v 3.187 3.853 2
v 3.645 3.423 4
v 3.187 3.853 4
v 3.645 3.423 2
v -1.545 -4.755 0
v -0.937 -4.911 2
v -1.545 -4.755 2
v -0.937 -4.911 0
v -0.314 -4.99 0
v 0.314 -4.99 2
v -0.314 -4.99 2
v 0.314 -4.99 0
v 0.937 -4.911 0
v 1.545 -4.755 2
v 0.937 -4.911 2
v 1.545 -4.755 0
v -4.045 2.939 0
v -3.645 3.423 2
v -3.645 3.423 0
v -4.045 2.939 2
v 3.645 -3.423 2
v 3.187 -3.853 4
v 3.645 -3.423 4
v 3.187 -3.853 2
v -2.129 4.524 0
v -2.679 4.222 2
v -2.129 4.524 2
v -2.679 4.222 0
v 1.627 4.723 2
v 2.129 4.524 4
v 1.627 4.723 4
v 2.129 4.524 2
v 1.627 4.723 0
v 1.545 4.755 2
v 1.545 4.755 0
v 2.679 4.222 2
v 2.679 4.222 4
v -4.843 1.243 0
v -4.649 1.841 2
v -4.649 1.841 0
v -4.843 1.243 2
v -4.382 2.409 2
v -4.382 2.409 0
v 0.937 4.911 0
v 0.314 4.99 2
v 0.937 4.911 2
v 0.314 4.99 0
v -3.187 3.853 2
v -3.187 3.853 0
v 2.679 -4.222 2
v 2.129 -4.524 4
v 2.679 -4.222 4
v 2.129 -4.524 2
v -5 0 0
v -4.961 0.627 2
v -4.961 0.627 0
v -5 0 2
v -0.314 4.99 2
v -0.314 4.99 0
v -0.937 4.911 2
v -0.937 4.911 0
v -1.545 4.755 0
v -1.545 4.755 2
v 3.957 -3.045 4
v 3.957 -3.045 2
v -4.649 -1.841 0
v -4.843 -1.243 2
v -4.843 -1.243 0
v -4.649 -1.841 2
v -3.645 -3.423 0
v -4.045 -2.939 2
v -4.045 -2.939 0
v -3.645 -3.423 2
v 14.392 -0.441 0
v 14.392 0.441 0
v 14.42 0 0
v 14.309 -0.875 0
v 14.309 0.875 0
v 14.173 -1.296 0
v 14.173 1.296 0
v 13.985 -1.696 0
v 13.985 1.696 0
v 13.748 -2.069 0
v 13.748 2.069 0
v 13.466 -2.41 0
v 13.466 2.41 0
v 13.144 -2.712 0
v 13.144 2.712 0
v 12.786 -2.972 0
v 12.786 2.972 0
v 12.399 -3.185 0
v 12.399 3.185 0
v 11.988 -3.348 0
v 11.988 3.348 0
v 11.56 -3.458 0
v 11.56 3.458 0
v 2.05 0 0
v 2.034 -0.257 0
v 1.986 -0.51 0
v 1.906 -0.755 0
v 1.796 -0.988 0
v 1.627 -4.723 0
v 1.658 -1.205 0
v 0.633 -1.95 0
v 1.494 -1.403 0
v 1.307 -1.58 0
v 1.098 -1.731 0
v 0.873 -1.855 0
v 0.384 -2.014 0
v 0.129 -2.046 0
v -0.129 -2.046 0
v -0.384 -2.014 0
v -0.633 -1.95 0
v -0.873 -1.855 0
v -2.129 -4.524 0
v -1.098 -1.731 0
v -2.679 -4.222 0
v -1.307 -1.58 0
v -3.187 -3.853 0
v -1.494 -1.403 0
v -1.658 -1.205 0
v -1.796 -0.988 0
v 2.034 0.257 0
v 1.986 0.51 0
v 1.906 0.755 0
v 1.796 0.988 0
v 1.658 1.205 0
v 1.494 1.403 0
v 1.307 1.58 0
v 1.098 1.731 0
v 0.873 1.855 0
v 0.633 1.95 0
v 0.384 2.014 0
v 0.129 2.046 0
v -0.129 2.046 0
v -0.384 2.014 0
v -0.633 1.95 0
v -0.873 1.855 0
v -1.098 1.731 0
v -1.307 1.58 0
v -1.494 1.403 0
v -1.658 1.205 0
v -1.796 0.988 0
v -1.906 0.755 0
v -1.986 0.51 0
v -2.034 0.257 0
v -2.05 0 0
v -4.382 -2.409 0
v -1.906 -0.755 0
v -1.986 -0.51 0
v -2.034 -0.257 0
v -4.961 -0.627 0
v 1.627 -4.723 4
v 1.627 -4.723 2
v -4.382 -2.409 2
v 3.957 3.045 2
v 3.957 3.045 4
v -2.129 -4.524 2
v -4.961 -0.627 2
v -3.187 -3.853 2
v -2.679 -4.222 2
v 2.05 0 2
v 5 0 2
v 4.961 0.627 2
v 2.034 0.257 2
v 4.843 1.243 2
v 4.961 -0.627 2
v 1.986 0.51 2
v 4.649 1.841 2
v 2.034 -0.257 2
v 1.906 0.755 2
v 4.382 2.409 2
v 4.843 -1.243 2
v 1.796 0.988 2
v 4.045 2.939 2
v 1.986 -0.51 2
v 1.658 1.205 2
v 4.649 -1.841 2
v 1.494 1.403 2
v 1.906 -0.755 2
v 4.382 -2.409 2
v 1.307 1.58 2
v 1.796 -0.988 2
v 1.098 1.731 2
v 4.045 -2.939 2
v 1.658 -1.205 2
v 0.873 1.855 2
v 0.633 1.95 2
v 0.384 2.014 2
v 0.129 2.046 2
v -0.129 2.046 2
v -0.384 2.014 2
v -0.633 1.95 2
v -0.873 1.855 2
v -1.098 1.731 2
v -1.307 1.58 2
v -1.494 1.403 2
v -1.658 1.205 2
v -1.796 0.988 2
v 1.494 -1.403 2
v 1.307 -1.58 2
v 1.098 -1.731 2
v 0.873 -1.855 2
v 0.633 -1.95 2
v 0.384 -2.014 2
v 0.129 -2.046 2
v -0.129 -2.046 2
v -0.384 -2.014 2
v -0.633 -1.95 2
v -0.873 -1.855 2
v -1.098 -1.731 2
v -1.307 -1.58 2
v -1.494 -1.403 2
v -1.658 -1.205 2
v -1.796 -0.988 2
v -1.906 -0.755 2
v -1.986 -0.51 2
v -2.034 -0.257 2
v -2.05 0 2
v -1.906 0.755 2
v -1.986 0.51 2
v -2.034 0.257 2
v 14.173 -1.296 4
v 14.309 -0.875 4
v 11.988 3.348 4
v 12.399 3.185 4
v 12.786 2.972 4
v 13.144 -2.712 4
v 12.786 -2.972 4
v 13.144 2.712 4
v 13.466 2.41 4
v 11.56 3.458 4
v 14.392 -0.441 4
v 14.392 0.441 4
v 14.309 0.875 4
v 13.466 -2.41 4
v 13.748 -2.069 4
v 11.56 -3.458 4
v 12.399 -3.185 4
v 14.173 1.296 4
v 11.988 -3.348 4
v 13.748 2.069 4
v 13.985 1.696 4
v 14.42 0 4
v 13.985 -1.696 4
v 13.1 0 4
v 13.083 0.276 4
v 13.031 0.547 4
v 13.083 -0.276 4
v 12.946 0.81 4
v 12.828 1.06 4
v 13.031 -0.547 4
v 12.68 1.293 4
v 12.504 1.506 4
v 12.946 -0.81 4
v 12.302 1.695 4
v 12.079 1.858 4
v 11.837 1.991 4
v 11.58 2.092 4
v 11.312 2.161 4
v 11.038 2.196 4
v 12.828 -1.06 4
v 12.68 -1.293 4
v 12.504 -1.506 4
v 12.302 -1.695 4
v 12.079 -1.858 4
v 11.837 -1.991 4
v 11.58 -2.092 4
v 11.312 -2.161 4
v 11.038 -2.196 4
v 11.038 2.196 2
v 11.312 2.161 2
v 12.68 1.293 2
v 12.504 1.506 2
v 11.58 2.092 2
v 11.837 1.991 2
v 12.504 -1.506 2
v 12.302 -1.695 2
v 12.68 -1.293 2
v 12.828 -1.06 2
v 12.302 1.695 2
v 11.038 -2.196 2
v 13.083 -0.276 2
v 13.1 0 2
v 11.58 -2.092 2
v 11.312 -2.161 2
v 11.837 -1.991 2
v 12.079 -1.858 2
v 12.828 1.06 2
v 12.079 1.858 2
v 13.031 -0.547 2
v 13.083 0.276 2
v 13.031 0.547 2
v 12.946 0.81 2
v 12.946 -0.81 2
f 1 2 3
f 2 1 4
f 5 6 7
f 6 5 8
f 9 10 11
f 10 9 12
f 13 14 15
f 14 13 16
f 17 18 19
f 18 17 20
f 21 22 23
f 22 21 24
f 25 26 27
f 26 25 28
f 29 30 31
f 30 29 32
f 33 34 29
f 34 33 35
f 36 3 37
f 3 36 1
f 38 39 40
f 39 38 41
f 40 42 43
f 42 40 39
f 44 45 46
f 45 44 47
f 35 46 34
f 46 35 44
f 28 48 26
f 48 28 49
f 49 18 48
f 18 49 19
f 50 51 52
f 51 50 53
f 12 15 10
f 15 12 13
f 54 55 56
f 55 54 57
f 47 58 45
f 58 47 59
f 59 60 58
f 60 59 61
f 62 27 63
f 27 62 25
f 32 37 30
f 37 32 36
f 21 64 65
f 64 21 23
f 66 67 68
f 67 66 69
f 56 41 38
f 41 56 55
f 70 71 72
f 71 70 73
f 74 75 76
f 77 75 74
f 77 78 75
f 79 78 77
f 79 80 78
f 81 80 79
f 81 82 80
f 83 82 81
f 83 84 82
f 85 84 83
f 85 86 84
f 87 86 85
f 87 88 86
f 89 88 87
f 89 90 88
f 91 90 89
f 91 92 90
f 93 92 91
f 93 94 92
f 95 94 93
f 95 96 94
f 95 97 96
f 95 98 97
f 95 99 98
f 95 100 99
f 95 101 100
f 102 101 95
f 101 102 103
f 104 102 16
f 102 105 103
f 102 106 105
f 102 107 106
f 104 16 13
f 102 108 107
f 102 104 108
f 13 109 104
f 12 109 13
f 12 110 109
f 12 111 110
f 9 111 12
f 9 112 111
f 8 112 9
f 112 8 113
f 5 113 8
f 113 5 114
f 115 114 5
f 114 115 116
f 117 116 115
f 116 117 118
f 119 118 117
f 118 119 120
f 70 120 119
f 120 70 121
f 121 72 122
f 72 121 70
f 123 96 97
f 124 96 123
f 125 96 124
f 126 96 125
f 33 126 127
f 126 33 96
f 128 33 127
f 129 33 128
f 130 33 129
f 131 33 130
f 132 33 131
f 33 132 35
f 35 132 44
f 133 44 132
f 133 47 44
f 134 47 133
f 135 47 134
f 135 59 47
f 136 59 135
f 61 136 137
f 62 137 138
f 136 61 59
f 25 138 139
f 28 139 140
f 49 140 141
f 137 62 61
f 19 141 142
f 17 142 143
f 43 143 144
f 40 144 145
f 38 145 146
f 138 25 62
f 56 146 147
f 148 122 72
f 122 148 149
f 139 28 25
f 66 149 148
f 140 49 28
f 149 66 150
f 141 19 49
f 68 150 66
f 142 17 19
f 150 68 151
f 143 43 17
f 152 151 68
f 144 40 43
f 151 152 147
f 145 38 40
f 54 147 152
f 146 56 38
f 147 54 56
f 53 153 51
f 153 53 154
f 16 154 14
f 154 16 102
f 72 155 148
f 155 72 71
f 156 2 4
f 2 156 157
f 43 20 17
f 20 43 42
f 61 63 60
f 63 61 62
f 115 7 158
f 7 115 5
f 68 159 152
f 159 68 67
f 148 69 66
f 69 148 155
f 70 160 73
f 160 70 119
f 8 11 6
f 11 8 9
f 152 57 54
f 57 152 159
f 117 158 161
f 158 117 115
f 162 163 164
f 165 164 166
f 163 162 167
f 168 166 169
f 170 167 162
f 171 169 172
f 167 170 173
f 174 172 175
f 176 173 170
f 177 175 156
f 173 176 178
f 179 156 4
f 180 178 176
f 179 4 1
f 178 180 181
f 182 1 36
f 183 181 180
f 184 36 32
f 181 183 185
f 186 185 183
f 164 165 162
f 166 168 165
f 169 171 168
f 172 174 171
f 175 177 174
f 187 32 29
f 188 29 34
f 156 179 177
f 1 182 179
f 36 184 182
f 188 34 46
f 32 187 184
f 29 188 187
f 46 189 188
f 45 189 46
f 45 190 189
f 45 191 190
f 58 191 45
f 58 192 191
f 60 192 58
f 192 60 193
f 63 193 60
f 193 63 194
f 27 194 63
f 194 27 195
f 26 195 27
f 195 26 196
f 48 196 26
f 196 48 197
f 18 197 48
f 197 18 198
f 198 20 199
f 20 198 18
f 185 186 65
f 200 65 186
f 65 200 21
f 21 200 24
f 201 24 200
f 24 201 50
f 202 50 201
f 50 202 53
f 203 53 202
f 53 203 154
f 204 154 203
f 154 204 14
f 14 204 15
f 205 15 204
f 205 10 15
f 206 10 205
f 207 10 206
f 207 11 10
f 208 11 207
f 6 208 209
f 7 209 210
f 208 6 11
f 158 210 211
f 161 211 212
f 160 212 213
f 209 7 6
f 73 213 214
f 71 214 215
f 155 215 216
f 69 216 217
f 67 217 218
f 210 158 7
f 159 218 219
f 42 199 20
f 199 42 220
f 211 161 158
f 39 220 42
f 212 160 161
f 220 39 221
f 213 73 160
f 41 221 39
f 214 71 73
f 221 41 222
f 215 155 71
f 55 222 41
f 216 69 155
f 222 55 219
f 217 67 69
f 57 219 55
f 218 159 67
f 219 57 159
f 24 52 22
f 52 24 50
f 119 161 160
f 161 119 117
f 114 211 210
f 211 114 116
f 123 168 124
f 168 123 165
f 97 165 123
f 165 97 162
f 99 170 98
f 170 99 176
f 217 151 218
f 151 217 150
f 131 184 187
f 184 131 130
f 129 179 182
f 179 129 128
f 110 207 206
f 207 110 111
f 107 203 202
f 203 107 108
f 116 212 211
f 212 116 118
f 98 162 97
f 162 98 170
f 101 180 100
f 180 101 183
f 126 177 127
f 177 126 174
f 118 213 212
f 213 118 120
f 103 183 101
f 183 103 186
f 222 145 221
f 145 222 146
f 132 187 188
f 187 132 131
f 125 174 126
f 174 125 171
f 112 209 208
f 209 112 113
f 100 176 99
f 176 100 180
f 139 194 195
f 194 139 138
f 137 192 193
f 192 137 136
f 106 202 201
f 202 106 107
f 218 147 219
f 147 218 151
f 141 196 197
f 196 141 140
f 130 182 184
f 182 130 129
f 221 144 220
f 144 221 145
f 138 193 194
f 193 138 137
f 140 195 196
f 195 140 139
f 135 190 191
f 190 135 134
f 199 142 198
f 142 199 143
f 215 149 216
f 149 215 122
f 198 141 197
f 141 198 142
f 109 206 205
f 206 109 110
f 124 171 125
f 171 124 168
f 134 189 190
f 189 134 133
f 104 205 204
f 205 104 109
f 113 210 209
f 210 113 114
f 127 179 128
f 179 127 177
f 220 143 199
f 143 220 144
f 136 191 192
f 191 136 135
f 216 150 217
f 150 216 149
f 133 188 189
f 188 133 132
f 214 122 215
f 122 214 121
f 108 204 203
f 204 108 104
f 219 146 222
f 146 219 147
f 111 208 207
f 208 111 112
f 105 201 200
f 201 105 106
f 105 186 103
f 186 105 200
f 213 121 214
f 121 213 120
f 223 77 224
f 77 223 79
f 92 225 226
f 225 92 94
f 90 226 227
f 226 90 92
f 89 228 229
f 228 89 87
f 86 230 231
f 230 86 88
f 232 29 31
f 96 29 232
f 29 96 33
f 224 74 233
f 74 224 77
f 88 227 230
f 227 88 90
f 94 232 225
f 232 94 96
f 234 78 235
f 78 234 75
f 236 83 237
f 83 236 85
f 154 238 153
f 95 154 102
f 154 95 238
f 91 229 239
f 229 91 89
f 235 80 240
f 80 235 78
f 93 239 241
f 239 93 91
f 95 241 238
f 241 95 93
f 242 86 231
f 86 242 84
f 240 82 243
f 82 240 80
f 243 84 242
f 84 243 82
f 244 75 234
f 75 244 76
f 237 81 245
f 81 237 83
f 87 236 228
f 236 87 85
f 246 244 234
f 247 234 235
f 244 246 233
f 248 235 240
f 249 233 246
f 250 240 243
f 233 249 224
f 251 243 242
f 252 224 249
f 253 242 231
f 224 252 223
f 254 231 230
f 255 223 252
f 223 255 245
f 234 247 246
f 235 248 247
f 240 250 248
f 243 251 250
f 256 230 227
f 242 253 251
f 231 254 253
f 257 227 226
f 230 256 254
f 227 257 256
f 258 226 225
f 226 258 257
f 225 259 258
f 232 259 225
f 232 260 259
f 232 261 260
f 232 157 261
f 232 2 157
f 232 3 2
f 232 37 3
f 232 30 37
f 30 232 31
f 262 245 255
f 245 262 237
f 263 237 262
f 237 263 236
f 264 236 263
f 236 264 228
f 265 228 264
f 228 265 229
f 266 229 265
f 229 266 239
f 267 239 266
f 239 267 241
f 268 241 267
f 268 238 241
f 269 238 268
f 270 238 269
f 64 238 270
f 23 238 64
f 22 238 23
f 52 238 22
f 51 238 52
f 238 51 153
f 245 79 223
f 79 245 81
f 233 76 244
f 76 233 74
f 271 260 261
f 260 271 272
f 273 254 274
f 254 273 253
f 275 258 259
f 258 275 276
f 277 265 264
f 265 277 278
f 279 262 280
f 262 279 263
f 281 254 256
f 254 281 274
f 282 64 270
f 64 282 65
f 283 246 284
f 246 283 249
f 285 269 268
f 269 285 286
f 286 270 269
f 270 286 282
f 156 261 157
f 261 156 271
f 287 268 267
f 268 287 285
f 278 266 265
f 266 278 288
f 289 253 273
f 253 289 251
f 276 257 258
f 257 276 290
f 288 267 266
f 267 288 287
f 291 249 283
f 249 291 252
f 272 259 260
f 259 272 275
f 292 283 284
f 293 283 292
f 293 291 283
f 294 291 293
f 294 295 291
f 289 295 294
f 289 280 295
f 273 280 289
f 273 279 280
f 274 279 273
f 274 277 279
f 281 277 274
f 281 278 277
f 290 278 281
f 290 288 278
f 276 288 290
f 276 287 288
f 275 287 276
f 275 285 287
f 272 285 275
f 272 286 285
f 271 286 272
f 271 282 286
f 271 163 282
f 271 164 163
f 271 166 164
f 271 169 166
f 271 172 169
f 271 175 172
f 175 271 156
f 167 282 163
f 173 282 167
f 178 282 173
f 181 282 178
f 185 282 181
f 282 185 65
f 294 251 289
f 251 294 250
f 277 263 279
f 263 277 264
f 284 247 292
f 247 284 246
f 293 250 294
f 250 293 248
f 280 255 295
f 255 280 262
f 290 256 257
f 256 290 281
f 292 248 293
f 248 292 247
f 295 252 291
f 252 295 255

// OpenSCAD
// parameters
RESOLUTION = 50;

module BananaJackMounter($fn) {
    r_screw = 2.05;
    r_outer_screw = 3.5;
    r_washer = 5;
    d_fixhole = 10.9;
    r_fixhole = 0.75;
    r_outer_fixhole = 2.2;

    difference() {
    cylinder(r=r_washer, h=2, $fn=RESOLUTION);
    cylinder(r=r_screw, h=4, $fn=RESOLUTION);
}

    difference() {
        difference() {
            hull() {
                cylinder(r=r_outer_screw*1.4, h=4, $fn=$fn);
                translate([d_fixhole, 0, 0])
                    cylinder(r=r_outer_fixhole*1.6, h=4, $fn=$fn);
            }
        
            hull() {
                translate([0, 0, 2])
                cylinder(r=r_outer_screw, h=2, $fn=$fn);
                translate([d_fixhole, 0, 2])
                    cylinder(r=r_outer_fixhole, h=2, $fn=$fn);
            }
        }

        cylinder(r=r_washer, h=4, $fn=RESOLUTION);
    }

}

// main
BananaJackMounter($fn=RESOLUTION);
